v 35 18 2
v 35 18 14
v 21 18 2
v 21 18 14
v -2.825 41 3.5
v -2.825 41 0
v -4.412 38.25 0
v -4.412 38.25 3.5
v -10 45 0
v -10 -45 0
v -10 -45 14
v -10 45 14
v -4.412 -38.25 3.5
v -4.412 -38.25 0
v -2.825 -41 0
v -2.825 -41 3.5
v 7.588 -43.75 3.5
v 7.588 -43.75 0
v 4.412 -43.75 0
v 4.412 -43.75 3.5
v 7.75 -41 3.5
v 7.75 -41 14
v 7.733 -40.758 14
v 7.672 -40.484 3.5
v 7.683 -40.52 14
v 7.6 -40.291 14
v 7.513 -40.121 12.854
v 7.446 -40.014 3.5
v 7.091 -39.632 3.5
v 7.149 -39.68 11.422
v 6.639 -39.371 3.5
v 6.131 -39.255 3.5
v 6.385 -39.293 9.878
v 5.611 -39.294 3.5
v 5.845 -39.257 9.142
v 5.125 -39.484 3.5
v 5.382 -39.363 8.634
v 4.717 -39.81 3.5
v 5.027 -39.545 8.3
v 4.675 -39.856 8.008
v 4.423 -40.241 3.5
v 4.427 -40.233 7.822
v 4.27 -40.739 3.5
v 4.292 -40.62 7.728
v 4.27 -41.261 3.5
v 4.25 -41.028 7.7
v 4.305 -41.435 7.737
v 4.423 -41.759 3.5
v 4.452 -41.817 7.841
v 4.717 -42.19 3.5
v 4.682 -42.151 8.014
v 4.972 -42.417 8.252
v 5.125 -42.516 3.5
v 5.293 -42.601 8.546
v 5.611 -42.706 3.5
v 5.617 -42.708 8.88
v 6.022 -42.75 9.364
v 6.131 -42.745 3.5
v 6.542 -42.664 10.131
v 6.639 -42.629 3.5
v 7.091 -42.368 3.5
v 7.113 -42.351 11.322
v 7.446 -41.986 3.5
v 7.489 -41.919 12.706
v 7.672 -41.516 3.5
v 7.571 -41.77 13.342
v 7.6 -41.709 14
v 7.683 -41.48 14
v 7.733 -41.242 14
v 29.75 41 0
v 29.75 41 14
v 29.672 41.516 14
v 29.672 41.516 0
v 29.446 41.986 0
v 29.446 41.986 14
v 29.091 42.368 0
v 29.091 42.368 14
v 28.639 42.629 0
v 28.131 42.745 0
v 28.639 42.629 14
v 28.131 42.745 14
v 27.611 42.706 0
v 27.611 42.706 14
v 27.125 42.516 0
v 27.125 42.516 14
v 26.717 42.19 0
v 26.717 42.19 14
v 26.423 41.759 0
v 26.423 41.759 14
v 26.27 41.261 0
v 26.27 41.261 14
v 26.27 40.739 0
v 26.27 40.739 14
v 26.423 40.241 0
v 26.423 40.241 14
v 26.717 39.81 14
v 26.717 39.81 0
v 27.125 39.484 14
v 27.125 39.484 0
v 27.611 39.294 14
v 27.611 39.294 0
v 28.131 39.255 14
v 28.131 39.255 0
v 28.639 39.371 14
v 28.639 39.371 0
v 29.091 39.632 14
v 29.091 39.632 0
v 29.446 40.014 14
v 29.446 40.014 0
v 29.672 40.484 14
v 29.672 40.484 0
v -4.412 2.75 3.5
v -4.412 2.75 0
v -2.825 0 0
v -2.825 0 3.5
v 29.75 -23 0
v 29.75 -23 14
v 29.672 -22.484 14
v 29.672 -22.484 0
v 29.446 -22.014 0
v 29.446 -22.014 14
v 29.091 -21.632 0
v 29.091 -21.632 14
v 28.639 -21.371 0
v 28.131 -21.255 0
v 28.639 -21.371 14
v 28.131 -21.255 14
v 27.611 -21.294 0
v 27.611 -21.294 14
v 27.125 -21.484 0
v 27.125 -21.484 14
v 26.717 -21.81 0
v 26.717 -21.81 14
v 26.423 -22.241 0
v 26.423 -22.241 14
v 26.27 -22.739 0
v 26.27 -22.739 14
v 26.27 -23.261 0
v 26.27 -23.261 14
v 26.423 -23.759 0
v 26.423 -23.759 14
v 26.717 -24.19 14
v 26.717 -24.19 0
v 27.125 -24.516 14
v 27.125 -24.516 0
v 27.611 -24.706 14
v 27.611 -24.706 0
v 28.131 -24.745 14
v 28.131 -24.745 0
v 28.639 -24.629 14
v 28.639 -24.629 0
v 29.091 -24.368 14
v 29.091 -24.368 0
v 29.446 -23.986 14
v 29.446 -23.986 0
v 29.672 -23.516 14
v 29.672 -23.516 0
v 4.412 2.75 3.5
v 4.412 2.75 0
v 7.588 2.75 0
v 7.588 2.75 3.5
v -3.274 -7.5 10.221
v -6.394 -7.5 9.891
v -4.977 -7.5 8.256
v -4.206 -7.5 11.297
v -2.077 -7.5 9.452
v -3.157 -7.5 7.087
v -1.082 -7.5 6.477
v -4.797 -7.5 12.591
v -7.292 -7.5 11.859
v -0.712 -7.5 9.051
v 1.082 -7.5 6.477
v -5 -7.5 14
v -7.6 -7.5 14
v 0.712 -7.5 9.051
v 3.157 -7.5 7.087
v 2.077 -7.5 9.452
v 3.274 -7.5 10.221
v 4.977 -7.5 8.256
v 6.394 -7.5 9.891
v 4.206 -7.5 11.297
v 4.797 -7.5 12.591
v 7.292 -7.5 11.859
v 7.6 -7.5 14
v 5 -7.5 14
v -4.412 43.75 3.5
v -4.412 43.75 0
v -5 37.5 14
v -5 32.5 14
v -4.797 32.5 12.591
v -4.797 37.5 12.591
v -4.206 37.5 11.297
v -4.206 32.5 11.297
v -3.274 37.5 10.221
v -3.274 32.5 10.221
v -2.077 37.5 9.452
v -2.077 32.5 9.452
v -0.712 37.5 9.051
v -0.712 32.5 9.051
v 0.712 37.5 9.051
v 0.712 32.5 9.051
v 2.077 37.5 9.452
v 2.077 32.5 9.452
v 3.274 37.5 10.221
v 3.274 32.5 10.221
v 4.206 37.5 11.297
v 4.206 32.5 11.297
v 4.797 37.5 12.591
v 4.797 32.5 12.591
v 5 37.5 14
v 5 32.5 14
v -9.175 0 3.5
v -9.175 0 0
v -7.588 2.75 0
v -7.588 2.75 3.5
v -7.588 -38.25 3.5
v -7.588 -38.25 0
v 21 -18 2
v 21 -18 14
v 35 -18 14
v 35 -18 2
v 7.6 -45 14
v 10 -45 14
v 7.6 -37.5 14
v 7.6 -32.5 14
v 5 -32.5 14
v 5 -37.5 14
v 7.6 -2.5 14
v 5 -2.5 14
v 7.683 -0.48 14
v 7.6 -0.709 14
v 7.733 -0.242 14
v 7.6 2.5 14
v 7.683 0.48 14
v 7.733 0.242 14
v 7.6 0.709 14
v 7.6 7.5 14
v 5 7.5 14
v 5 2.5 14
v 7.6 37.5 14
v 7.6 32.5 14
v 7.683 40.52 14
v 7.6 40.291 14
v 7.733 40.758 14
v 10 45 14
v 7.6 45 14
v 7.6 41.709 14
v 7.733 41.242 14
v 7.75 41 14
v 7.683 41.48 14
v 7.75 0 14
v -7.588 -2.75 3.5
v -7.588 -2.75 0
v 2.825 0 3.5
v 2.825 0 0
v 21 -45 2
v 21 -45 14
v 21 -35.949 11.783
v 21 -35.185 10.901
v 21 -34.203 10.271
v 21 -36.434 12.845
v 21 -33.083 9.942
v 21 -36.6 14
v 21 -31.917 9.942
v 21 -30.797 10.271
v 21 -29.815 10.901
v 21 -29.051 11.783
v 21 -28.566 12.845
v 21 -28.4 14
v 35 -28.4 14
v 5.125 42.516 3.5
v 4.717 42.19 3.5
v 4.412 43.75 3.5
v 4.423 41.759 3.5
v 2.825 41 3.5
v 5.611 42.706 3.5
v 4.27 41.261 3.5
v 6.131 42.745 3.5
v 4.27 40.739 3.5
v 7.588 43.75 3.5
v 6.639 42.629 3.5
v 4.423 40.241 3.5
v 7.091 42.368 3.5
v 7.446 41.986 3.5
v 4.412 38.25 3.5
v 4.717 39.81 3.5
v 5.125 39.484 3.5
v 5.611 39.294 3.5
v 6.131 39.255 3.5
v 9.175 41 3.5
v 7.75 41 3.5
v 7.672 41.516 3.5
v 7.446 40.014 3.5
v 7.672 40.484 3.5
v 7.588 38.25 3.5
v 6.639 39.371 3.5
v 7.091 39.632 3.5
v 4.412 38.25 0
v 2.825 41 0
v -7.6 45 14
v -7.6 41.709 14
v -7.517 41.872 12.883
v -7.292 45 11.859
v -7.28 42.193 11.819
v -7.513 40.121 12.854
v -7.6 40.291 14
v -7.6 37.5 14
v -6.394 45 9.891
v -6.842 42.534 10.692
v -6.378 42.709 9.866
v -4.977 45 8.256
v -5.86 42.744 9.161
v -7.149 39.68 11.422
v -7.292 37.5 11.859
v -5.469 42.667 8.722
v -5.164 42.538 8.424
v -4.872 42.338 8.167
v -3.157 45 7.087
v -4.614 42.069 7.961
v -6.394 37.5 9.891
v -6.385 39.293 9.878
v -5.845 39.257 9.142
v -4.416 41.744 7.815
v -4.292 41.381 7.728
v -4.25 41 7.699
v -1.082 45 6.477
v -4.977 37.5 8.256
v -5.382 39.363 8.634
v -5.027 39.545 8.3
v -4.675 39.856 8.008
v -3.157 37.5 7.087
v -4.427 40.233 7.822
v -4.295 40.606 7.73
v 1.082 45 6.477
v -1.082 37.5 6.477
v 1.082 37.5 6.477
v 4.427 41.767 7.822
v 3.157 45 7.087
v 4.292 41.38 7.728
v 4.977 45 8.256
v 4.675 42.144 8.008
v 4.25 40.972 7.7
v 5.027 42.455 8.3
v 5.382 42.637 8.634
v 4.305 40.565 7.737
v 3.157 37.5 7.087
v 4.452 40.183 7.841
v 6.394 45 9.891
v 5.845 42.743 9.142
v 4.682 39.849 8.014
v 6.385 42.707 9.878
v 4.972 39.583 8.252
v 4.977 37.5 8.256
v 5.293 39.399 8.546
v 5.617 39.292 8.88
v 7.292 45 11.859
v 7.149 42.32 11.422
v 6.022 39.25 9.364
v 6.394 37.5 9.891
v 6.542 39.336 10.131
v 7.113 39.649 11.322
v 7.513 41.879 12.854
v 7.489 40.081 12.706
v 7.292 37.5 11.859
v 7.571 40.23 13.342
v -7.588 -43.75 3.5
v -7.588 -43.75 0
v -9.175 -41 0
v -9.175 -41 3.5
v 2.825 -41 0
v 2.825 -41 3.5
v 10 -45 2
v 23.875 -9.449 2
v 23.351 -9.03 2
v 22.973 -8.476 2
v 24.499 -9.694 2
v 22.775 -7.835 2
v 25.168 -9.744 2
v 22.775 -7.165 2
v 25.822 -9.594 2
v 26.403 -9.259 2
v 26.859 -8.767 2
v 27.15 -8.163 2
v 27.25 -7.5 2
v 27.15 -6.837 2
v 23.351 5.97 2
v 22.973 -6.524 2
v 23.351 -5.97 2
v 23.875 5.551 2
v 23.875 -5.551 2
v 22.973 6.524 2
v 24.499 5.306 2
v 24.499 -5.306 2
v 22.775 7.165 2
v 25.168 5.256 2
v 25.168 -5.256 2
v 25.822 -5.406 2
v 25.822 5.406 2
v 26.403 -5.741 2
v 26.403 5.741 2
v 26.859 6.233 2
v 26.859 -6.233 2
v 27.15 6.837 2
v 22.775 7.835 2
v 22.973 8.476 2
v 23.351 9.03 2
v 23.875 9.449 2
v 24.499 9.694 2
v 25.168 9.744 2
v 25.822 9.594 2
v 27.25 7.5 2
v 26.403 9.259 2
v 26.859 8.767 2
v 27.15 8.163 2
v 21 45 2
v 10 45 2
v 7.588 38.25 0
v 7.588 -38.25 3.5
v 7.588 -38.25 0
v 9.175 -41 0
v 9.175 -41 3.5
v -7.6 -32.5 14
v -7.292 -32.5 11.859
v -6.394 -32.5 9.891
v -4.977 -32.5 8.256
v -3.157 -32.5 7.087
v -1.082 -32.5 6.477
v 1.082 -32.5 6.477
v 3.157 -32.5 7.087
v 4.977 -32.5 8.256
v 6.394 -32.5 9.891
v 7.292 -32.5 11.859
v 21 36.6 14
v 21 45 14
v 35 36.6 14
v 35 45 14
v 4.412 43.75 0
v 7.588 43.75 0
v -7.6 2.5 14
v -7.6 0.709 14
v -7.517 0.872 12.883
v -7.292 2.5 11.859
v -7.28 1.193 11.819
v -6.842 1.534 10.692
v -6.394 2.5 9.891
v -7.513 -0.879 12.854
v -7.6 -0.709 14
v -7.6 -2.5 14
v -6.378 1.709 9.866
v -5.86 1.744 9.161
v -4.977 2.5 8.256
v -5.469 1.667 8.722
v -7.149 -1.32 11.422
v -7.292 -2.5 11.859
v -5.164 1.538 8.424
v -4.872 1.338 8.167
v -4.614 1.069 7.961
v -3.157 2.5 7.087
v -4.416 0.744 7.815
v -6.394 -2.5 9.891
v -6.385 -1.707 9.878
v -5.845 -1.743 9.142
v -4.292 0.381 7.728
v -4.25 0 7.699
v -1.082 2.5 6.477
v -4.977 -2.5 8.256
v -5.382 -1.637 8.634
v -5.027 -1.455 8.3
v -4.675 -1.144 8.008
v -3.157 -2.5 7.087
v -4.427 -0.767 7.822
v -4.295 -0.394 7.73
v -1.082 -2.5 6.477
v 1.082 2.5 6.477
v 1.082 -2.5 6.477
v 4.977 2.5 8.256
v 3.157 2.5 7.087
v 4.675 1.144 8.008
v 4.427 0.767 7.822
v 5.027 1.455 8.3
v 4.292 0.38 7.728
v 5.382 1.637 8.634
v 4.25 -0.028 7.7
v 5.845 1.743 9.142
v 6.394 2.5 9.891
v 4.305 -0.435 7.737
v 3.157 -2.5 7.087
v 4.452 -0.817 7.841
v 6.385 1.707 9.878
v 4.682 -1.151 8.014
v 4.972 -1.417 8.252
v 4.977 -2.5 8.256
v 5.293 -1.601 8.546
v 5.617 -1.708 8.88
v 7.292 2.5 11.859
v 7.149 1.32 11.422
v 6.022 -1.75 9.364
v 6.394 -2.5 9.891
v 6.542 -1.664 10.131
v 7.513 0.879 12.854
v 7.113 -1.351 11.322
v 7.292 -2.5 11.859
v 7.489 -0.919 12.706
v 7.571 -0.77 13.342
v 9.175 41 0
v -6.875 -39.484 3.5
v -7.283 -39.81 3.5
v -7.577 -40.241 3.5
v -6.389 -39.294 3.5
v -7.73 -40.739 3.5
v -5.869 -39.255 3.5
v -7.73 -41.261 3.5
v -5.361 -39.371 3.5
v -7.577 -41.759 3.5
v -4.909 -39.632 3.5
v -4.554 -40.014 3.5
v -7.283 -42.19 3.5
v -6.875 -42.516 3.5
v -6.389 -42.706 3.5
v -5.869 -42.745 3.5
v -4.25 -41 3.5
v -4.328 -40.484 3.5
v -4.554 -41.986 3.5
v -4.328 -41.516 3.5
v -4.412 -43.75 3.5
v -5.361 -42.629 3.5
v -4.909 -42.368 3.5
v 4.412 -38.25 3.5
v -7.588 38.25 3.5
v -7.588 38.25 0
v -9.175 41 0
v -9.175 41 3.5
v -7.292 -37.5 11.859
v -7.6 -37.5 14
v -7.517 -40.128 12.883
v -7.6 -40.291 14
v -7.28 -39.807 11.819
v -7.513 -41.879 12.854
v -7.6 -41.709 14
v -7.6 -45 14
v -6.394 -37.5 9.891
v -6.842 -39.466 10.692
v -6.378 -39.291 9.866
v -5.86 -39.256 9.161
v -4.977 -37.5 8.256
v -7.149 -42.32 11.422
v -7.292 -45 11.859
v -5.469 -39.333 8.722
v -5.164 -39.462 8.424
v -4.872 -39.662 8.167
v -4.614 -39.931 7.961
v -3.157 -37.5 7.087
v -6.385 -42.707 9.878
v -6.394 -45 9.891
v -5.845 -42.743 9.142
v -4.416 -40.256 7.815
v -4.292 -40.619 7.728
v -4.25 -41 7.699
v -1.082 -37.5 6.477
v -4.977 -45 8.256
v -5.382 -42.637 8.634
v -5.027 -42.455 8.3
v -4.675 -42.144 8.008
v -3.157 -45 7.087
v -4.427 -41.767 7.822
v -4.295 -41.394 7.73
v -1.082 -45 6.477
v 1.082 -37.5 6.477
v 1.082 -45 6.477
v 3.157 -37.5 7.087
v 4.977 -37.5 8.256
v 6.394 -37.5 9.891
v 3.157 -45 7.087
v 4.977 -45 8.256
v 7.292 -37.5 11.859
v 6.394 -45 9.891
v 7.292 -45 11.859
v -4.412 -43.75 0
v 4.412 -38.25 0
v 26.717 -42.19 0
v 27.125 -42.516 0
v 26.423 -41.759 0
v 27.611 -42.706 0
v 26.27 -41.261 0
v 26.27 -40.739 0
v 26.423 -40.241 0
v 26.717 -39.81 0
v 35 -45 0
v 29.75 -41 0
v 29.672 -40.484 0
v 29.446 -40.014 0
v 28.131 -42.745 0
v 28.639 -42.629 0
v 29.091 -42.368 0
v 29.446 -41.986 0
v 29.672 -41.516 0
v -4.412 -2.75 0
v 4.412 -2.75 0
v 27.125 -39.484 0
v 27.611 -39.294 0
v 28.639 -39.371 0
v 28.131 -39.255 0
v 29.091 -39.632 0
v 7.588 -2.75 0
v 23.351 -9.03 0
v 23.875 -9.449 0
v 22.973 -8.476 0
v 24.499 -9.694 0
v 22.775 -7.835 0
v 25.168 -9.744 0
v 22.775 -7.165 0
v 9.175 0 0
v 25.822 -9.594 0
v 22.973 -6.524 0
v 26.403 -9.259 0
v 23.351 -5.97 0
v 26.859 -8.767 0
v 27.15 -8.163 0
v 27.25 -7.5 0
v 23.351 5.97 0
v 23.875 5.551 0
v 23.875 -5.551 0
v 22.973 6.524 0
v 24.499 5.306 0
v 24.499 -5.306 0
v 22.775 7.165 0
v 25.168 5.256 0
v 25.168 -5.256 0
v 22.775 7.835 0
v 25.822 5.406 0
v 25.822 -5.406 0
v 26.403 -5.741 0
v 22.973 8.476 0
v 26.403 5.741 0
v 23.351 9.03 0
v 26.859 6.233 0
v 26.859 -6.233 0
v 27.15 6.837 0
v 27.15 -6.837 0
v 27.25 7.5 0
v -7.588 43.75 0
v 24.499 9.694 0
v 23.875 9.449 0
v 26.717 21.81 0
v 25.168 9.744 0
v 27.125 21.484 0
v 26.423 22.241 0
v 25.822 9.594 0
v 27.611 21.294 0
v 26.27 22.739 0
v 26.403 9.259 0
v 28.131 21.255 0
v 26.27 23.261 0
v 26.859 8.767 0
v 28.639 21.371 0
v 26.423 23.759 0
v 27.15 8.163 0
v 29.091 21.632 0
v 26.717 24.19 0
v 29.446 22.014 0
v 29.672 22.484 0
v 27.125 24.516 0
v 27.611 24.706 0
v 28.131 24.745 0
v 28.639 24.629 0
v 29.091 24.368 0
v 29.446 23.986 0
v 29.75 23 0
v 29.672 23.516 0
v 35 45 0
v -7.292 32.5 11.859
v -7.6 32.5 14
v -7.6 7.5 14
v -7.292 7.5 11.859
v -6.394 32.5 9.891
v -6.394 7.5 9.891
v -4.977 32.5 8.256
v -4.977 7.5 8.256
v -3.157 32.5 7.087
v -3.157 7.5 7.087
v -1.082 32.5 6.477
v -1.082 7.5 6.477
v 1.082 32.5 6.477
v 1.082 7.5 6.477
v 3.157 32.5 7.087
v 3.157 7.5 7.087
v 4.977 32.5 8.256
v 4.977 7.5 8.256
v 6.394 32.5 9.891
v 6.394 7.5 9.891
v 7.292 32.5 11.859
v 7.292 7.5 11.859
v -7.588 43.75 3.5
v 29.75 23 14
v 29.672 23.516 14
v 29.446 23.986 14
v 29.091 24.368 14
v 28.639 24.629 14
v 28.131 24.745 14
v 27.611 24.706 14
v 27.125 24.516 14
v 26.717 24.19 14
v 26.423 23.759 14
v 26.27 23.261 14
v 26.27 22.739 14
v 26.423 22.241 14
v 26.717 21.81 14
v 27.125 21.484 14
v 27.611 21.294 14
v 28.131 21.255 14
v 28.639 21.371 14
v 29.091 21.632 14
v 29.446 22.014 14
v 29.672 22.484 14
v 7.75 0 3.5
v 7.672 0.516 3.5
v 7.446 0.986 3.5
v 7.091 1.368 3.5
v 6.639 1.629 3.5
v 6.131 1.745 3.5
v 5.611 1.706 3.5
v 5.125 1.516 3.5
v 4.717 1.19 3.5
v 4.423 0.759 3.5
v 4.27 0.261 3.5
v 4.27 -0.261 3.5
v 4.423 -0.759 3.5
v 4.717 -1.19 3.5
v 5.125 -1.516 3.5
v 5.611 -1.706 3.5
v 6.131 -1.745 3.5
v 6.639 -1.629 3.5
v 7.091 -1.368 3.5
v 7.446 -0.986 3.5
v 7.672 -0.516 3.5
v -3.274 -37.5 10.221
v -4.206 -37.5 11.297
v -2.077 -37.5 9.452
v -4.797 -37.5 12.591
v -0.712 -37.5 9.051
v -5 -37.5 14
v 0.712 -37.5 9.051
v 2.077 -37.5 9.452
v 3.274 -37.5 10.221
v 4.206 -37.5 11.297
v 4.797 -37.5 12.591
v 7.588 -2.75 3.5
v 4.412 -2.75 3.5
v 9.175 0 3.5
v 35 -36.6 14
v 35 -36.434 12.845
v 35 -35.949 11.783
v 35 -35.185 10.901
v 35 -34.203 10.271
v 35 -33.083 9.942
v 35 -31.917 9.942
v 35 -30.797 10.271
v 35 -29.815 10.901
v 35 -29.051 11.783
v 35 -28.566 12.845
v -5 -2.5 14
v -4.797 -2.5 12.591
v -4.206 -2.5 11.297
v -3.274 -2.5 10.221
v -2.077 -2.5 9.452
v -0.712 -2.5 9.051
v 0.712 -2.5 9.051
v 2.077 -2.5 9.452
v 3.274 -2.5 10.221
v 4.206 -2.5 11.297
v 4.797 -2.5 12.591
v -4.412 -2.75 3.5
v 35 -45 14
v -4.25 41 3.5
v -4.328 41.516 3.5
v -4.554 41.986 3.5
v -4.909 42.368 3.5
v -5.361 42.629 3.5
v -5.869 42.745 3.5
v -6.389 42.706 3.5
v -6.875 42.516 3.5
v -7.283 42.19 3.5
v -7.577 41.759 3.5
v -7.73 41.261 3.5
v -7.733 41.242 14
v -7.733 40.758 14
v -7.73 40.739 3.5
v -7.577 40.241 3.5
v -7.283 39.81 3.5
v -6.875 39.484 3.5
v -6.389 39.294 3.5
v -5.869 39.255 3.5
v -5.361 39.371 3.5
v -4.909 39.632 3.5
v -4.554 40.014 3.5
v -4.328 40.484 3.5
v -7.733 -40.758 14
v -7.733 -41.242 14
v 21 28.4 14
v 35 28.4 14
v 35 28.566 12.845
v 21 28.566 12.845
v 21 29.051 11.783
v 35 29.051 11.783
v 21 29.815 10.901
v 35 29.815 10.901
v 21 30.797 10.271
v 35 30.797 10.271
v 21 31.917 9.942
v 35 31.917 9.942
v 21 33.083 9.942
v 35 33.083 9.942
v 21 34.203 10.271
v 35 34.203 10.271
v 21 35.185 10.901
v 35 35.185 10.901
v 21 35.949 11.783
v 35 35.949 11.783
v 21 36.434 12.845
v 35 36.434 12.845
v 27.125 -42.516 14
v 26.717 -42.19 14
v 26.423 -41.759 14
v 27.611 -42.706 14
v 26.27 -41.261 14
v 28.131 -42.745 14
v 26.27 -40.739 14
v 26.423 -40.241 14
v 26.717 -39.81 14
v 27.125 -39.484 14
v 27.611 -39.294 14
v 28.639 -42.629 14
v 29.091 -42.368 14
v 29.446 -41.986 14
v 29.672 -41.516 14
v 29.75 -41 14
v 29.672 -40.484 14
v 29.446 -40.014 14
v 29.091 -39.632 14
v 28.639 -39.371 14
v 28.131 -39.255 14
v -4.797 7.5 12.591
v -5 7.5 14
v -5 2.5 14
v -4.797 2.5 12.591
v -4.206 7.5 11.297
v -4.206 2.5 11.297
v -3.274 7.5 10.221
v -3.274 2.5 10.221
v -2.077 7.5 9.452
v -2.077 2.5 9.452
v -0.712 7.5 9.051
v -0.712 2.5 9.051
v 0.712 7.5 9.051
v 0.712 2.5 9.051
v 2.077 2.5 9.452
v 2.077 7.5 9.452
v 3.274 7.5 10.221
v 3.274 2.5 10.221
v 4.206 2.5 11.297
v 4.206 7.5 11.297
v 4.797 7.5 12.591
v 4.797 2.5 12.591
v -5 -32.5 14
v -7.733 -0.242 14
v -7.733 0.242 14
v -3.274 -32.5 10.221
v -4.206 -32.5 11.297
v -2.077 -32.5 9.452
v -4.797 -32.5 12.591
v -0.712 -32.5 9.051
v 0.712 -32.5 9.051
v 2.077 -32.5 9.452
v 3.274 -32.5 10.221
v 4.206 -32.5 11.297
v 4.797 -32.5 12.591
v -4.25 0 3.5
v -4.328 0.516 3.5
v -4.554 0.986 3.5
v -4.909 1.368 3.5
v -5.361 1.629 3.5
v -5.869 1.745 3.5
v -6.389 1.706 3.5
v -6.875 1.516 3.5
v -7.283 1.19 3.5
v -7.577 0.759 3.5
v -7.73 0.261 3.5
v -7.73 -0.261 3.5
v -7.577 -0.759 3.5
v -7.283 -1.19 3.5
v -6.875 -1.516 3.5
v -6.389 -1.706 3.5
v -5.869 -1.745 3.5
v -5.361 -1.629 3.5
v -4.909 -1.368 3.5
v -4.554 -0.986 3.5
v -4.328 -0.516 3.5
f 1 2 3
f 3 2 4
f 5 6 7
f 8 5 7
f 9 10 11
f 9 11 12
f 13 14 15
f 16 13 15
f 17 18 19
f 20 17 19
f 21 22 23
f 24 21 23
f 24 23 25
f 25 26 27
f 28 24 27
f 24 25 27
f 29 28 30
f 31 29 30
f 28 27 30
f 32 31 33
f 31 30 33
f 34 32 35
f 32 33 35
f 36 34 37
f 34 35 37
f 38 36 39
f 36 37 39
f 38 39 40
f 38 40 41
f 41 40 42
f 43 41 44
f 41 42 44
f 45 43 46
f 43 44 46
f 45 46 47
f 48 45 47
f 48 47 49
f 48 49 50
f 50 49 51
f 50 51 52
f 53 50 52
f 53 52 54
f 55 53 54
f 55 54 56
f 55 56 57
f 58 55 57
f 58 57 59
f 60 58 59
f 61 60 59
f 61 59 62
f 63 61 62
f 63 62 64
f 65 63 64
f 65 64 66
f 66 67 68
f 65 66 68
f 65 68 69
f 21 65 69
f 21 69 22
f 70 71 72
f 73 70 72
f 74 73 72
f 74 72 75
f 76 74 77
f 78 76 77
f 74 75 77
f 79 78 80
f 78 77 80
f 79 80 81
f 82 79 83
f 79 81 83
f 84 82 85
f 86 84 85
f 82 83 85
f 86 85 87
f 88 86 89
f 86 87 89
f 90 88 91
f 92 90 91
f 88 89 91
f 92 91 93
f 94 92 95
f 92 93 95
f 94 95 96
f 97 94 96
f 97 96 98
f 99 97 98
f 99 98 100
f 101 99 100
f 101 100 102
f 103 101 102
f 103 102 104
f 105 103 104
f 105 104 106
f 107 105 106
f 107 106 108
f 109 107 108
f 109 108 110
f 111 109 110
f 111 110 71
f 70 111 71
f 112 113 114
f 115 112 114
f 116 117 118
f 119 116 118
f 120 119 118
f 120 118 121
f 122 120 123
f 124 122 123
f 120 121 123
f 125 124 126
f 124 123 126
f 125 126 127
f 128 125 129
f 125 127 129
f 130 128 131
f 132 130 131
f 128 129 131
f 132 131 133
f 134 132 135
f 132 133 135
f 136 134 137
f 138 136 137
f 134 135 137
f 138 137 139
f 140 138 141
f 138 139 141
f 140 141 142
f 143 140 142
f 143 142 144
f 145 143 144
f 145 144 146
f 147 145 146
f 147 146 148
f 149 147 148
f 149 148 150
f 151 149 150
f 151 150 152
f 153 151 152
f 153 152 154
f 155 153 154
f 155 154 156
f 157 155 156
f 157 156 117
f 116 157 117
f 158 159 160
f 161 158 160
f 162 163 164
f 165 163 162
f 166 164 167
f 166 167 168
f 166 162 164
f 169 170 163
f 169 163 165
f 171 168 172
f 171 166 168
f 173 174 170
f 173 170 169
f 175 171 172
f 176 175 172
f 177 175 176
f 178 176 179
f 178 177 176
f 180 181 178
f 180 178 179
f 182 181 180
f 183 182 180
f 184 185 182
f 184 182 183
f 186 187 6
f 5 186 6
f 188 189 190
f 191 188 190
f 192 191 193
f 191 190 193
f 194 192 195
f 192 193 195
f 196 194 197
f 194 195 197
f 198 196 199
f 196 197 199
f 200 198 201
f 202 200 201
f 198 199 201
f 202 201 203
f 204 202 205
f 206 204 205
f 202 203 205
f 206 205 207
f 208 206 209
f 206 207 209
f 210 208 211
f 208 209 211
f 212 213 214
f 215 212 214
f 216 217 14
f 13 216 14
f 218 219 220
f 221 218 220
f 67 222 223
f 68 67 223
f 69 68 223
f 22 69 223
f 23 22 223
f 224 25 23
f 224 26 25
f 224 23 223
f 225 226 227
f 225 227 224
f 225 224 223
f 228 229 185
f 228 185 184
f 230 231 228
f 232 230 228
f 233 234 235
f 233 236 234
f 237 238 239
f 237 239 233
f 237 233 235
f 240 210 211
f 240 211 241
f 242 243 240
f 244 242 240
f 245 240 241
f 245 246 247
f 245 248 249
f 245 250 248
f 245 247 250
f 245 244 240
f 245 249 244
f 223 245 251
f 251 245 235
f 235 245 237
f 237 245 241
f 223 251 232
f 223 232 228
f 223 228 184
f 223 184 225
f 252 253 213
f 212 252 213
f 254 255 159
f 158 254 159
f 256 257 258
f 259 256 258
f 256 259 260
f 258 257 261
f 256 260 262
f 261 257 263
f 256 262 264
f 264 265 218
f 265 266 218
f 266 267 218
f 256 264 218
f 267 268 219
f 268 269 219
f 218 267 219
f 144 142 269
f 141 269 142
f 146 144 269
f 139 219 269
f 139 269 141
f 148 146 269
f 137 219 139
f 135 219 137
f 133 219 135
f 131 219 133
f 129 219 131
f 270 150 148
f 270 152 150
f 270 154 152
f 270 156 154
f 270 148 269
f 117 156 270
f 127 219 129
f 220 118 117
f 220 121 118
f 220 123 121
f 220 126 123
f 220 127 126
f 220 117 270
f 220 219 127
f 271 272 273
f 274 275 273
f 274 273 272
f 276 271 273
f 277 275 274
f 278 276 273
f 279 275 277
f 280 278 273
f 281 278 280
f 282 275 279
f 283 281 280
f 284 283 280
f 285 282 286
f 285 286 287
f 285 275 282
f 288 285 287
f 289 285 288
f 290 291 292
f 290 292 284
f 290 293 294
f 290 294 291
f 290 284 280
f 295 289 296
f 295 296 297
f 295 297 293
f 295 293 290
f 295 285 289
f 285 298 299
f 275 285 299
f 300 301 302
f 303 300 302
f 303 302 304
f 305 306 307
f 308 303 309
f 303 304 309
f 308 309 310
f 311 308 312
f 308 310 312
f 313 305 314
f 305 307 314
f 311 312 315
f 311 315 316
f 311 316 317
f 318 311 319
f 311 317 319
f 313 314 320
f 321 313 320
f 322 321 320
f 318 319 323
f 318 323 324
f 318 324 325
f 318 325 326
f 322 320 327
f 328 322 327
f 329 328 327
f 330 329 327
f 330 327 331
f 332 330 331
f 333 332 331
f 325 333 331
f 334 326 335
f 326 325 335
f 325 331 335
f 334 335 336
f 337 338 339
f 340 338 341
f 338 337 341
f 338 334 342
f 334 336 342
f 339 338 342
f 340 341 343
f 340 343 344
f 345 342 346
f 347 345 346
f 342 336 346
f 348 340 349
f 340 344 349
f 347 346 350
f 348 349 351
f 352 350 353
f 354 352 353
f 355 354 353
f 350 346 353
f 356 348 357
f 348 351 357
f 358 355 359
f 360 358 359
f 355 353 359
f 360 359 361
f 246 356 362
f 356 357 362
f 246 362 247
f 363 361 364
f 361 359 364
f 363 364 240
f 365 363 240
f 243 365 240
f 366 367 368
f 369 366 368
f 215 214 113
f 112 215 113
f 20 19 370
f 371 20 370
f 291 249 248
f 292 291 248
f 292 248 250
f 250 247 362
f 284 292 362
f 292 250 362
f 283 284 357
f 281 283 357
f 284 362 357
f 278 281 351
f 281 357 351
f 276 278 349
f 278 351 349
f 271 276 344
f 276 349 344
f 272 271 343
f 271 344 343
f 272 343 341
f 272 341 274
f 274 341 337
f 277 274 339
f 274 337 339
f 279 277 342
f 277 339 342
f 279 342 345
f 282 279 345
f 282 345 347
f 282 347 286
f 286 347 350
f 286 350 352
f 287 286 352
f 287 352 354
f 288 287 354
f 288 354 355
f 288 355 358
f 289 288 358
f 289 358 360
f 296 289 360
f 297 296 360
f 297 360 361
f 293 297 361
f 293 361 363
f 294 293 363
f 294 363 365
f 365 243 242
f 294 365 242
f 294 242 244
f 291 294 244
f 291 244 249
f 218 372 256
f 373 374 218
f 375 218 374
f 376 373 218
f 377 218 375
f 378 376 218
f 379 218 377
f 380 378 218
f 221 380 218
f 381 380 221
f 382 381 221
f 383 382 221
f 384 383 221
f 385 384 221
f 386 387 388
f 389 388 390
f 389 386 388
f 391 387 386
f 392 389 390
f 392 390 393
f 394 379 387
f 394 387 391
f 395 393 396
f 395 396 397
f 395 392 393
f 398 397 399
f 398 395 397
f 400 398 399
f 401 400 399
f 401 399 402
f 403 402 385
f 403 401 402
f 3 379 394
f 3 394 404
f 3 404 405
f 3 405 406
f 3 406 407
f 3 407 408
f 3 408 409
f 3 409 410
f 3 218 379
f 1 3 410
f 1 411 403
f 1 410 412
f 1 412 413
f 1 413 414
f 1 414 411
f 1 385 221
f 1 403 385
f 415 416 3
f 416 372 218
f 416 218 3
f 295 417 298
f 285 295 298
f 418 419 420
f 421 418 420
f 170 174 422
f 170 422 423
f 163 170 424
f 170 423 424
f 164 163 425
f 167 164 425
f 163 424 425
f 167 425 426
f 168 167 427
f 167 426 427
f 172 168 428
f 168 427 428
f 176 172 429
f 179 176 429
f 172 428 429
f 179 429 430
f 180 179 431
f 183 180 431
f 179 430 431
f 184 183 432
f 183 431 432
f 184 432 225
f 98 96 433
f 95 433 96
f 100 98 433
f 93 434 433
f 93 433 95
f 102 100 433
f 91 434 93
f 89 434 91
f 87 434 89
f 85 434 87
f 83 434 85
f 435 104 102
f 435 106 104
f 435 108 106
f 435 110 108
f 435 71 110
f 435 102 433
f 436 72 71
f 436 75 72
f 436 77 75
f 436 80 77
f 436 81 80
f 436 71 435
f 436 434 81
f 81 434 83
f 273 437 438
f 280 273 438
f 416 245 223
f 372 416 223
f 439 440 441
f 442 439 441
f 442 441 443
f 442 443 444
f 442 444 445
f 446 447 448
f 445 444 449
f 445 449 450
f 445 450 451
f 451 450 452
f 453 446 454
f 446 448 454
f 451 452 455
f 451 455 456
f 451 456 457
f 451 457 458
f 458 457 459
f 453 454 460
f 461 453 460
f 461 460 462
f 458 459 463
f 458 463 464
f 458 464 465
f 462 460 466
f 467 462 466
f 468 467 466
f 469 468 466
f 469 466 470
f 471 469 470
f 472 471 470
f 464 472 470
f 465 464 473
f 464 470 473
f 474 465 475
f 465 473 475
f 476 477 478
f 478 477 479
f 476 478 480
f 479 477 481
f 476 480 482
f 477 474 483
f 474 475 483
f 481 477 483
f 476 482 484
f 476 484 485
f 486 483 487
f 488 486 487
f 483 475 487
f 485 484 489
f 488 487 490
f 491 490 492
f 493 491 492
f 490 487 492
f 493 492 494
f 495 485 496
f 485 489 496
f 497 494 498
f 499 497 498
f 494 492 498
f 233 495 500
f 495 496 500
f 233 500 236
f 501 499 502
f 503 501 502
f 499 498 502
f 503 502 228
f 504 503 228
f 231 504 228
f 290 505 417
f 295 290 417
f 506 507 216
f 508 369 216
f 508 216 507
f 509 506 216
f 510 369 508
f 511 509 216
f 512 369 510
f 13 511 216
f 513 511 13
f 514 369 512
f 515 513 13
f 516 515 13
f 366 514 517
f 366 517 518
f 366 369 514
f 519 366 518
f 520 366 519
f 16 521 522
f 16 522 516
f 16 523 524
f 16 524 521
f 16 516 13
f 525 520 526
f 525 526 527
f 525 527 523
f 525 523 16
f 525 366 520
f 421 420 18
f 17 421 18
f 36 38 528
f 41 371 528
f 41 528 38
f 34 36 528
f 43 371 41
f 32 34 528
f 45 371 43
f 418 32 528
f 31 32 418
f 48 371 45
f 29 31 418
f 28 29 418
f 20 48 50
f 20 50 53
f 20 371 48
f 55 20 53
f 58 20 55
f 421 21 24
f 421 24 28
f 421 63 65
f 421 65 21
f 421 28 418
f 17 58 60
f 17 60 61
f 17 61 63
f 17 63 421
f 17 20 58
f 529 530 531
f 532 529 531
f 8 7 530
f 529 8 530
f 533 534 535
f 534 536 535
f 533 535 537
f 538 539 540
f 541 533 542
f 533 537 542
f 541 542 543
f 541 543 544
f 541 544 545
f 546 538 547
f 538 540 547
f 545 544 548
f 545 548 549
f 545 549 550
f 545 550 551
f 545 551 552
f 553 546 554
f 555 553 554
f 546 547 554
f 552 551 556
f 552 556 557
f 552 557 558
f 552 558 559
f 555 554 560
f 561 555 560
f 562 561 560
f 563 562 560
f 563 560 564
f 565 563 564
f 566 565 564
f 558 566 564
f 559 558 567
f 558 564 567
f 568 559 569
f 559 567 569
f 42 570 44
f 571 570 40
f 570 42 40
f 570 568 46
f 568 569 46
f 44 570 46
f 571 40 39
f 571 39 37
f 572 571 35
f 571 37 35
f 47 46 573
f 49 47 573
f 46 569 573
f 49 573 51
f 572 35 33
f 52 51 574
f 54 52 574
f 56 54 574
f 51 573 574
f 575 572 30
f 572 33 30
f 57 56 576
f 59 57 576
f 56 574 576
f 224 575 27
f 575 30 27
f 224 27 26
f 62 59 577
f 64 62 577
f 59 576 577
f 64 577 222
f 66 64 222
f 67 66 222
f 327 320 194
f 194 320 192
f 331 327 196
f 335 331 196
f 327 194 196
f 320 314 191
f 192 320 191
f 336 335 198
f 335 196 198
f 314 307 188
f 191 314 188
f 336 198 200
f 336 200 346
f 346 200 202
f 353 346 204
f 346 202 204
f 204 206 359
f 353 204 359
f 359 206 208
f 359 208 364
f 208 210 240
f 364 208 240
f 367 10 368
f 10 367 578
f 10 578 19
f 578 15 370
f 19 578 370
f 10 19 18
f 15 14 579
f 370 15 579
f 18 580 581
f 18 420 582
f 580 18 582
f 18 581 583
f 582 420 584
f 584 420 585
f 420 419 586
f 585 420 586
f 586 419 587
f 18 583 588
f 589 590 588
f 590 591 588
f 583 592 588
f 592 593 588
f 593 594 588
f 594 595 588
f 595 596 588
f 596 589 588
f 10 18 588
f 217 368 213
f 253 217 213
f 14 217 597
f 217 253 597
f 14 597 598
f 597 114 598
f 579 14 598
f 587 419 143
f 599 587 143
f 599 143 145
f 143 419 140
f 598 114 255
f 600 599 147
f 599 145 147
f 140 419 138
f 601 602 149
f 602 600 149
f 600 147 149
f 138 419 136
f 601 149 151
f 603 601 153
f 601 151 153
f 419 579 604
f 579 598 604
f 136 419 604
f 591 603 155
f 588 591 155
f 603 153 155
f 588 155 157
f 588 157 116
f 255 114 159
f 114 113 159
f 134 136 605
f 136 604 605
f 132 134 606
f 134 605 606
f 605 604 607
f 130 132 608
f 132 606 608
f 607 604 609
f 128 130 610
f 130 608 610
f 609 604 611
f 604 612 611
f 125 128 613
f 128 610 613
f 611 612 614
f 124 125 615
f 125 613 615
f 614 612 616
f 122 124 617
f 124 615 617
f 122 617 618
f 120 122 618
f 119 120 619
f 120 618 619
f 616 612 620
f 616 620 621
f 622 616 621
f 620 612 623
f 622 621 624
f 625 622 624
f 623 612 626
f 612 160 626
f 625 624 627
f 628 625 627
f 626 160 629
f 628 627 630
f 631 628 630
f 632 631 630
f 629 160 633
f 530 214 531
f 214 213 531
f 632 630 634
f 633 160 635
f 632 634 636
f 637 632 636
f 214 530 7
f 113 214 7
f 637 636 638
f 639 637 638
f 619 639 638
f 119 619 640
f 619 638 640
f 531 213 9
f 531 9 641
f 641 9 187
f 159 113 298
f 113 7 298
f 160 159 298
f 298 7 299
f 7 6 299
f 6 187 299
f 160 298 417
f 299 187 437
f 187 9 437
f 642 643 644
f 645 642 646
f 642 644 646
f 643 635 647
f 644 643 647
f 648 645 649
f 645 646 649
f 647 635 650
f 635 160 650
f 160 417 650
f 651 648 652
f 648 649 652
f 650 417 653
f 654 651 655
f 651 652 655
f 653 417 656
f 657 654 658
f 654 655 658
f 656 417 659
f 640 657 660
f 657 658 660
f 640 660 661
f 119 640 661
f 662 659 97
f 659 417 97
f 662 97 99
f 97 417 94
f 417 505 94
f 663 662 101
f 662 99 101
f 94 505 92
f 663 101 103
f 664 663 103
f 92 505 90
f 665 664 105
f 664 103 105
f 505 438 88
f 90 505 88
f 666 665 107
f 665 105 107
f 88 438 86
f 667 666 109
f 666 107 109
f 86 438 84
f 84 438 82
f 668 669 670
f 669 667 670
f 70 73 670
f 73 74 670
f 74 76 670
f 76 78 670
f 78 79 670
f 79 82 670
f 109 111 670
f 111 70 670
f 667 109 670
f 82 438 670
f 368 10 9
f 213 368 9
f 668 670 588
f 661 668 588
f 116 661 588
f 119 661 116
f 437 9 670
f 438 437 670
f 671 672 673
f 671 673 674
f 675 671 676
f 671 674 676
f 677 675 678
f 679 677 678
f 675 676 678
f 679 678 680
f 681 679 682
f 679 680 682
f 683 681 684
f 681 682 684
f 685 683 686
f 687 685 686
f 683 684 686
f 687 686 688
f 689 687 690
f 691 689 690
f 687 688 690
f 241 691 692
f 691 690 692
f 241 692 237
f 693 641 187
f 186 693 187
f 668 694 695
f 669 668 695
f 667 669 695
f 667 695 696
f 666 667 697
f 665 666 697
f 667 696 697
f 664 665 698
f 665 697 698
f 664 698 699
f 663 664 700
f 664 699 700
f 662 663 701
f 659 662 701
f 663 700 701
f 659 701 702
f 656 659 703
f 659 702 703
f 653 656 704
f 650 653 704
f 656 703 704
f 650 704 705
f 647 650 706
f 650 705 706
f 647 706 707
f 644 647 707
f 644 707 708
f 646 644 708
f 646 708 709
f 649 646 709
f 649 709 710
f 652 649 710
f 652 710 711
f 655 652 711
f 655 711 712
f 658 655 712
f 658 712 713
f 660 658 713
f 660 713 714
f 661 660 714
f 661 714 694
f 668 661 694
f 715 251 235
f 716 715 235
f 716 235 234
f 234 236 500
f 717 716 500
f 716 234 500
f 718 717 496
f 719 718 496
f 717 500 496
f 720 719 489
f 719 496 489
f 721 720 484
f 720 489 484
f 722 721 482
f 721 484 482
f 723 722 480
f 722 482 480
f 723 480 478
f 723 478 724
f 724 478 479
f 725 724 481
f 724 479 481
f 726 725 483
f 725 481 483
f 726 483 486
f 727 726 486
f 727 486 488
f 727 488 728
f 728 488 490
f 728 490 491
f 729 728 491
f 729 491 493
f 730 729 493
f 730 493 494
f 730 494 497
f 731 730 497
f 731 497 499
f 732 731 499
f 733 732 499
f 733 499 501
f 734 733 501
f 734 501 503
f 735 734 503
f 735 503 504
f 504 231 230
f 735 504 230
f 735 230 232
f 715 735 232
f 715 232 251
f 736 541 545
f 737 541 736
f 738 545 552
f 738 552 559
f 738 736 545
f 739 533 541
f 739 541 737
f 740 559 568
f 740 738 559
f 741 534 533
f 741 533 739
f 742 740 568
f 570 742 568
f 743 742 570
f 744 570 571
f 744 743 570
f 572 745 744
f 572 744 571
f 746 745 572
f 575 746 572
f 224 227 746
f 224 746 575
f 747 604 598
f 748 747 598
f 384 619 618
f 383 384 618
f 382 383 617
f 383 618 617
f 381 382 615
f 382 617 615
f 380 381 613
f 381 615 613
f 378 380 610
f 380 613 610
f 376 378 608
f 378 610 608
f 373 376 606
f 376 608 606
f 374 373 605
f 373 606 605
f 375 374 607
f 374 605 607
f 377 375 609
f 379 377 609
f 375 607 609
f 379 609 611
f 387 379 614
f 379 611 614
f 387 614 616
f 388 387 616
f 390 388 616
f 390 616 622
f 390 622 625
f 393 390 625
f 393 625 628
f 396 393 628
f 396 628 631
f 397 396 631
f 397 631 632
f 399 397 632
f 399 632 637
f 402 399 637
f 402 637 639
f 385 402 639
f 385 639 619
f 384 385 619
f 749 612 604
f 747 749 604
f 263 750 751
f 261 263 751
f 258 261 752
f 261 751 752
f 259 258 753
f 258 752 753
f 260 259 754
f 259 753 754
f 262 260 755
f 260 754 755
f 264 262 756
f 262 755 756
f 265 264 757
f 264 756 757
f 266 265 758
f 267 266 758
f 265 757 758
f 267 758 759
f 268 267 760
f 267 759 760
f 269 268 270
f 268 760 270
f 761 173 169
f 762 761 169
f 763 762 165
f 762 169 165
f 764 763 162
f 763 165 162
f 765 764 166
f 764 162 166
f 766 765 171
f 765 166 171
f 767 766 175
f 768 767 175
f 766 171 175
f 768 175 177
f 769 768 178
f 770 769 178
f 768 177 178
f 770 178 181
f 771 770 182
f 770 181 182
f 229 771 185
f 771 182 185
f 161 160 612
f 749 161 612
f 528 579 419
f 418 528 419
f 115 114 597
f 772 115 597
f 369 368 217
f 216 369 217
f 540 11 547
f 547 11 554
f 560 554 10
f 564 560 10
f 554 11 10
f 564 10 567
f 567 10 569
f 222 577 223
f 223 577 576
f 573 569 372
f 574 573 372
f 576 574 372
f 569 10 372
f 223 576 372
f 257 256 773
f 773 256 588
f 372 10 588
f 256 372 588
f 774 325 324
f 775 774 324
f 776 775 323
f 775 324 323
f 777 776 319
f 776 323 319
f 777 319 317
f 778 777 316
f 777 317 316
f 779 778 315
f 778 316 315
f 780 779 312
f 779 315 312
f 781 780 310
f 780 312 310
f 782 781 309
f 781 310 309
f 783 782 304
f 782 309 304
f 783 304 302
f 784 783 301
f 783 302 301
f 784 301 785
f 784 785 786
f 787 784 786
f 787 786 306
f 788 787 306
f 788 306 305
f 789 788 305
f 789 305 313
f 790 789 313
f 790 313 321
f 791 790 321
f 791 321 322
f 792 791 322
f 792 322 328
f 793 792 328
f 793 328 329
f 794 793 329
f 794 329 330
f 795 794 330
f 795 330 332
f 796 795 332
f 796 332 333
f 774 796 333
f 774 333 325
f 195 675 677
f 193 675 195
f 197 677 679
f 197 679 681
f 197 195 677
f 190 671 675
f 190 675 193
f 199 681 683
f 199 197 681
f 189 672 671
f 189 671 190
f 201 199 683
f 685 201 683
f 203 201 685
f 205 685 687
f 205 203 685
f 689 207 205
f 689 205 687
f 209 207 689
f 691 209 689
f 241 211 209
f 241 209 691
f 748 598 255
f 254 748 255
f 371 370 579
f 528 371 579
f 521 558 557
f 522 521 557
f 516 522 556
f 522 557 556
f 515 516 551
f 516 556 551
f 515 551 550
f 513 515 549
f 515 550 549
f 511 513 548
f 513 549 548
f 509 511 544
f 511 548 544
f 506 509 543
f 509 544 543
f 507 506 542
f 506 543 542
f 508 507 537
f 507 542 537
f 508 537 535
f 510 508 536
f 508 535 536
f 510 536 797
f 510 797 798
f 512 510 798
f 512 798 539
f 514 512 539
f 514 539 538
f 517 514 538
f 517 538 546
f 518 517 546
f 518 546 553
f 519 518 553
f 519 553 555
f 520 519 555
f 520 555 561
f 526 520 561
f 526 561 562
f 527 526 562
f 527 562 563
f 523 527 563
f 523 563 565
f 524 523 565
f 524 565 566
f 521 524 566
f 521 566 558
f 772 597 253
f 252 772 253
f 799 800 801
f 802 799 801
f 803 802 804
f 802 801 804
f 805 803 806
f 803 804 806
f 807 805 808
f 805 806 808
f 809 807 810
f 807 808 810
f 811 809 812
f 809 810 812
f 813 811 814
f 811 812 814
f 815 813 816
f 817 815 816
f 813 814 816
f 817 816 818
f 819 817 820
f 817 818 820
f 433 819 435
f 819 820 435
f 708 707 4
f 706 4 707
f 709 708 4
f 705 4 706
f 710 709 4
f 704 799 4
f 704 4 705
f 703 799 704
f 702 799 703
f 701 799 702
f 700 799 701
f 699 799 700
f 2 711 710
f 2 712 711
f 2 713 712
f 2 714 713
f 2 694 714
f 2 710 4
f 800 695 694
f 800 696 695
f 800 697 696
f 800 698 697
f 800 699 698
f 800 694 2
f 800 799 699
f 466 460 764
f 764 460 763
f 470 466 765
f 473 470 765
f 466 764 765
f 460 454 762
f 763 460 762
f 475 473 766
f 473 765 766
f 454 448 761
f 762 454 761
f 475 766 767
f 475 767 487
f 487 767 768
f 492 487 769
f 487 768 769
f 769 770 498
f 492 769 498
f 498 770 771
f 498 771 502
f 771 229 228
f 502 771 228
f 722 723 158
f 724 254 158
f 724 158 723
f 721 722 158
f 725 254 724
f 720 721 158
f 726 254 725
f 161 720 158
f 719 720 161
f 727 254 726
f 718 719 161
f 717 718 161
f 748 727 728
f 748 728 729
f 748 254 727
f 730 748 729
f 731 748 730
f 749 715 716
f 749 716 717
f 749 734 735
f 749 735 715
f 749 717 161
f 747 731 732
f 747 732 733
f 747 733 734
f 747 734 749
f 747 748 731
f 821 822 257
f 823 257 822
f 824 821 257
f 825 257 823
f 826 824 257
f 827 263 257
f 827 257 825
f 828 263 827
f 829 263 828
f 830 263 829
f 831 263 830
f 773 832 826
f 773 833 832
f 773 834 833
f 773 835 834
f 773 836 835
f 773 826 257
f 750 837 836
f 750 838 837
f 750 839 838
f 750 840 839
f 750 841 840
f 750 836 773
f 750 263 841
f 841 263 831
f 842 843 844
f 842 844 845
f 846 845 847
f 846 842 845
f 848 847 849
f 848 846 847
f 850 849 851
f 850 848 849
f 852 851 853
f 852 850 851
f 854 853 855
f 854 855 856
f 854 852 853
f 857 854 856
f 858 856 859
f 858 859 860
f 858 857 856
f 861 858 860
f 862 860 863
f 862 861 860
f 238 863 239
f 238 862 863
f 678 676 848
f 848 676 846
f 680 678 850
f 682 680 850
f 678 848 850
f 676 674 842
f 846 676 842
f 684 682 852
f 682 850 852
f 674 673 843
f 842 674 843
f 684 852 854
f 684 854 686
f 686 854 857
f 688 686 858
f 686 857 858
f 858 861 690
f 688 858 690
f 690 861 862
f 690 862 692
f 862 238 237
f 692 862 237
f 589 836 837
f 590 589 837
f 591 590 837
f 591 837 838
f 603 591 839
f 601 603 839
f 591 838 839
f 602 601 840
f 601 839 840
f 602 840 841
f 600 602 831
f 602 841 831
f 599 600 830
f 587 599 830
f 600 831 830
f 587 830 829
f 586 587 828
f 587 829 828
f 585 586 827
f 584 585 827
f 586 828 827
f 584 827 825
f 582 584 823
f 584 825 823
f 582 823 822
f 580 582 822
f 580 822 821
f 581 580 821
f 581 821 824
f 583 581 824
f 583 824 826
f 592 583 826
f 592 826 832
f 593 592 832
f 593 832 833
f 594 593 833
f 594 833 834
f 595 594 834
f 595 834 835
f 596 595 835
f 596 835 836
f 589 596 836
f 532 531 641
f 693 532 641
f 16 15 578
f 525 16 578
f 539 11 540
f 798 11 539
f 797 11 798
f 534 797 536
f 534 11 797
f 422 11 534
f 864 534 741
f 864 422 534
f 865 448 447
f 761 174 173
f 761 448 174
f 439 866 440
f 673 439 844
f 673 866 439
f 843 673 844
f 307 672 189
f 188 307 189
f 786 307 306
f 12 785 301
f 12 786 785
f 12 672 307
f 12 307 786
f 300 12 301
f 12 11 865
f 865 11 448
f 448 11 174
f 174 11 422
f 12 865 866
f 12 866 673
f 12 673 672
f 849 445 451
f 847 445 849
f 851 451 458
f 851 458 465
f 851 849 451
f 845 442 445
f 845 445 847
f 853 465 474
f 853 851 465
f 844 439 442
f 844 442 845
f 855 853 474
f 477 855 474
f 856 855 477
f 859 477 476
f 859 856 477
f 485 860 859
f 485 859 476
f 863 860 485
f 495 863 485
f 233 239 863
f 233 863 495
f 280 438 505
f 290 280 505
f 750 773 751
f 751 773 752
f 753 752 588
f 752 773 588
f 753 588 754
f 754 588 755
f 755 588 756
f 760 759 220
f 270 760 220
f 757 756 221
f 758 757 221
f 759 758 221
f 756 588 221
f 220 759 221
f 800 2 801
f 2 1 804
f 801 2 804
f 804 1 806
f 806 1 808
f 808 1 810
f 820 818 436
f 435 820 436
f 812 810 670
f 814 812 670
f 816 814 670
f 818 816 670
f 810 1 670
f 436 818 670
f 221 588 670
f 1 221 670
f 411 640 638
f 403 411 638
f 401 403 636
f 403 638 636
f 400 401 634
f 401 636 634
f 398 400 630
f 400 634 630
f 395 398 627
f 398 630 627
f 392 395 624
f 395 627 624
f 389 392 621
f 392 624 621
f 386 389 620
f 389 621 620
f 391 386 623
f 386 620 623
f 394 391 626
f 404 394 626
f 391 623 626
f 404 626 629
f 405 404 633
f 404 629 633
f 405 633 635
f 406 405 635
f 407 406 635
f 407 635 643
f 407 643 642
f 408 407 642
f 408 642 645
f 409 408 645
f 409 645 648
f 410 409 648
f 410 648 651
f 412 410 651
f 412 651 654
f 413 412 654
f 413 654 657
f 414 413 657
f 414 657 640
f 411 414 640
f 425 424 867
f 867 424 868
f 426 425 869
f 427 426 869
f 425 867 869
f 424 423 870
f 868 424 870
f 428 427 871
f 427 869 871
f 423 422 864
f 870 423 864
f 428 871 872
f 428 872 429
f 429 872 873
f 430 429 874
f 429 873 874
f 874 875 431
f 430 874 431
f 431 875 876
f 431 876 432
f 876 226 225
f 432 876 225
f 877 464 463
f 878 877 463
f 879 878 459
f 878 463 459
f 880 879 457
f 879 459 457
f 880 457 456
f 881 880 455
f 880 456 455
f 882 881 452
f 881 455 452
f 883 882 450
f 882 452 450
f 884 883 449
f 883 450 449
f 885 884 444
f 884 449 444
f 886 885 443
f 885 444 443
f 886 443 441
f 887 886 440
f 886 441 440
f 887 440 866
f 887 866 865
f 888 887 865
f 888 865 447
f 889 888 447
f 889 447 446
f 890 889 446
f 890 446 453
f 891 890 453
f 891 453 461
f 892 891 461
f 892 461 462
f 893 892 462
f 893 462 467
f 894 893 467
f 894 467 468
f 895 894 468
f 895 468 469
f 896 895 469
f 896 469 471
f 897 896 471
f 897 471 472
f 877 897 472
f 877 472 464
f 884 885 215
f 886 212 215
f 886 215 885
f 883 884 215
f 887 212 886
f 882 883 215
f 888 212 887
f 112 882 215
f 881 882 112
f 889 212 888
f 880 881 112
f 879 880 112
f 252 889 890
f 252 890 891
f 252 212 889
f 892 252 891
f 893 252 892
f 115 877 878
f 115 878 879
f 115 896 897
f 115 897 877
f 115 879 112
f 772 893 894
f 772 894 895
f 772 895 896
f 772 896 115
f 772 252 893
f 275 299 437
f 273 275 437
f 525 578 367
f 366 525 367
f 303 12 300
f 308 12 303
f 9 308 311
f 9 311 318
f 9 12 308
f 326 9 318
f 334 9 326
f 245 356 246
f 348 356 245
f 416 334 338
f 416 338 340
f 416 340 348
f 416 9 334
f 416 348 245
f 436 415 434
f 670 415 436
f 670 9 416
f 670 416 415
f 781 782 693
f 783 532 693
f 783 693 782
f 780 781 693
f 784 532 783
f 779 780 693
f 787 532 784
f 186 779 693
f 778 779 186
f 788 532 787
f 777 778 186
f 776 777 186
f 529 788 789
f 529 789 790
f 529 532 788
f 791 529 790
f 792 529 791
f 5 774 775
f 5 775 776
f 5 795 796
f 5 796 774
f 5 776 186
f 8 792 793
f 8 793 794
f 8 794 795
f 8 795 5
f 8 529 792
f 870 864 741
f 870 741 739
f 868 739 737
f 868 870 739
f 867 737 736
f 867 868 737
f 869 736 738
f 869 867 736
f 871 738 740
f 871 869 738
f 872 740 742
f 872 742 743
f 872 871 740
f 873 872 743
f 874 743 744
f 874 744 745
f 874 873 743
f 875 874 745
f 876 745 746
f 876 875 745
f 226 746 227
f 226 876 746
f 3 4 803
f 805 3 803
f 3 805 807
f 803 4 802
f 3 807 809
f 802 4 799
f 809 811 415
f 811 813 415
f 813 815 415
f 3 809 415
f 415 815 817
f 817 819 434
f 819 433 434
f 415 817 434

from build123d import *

# Parameters (mm, degrees)
PAD004_DEPTH    = 5
PAD003_DEPTH    = 5
PAD002_DEPTH    = 5
PAD001_DEPTH    = 5
SKETCH_W        = 45
SKETCH_H        = 90
PAD_DEPTH       = 14
SKETCH001_R     = 7.6
POCKET_DEPTH    = 90.001
SKETCH002_R     = 1.75
POCKET001_DEPTH = 14.001
POCKET002_DEPTH = 12
SKETCH004_R     = 2.25
POCKET003_DEPTH = 14.001
SKETCH008_R     = 4.1
POCKET005_DEPTH = 20
POCKET006_DEPTH = 3.5
POCKET007_DEPTH = 5


with BuildPart() as pad004:
    # Sketch021 → Pad004 (new body)
    with BuildSketch(Plane.XZ.offset(32.5)):
        with BuildLine():
            ThreePointArc((-7.6, 14), (0, 6.4), (7.6, 14))
            Line((7.6, 14), (5, 14))
            ThreePointArc((-5, 14), (0, 9), (5, 14))
            Line((-7.6, 14), (-5, 14))
        make_face()
    extrude(amount=PAD004_DEPTH)


with BuildPart() as pad003:
    # Sketch020 → Pad003 (new body)
    with BuildSketch(Plane.XZ.offset(-32.5)):
        with BuildLine():
            ThreePointArc((-7.6, 14), (0, 6.4), (7.6, 14))
            Line((7.6, 14), (5, 14))
            ThreePointArc((-5, 14), (0, 9), (5, 14))
            Line((-7.6, 14), (-5, 14))
        make_face()
    extrude(amount=-PAD003_DEPTH)


with BuildPart() as pad002:
    # Sketch019 → Pad002 (new body)
    with BuildSketch(Plane.XZ.offset(7.5)):
        with BuildLine():
            ThreePointArc((-7.6, 14), (0, 6.4), (7.6, 14))
            Line((7.6, 14), (5, 14))
            ThreePointArc((-5, 14), (0, 9), (5, 14))
            Line((-7.6, 14), (-5, 14))
        make_face()
    extrude(amount=-PAD002_DEPTH)


with BuildPart() as pad001:
    # Sketch018 → Pad001 (new body)
    with BuildSketch(Plane.XZ.offset(-7.5)):
        with BuildLine():
            ThreePointArc((-7.6, 14), (0, 6.4), (7.6, 14))
            Line((7.6, 14), (5, 14))
            ThreePointArc((-5, 14), (0, 9), (5, 14))
            Line((-7.6, 14), (-5, 14))
        make_face()
    extrude(amount=PAD001_DEPTH)


with BuildPart() as fusion:
    # Sketch → Pad (new body)
    with BuildSketch(Plane.XY):
        with Locations((12.5, 0)):
            Rectangle(SKETCH_W, SKETCH_H)
    extrude(amount=PAD_DEPTH)

    # Sketch001 → Pocket (cut, through all)
    with BuildSketch(Plane.XZ.offset(45)):
        with Locations((0, 14)):
            Circle(SKETCH001_R)
    extrude(amount=-POCKET_DEPTH, mode=Mode.SUBTRACT)

    # Sketch002 → Pocket001 (cut, through all)
    with BuildSketch(Plane.XY.offset(14)):
        with Locations((-6, 41)):
            Circle(SKETCH002_R)
        with Locations((-6, -41)):
            Circle(SKETCH002_R)
        with Locations((6, 41)):
            Circle(SKETCH002_R)
        with Locations((6, -41)):
            Circle(SKETCH002_R)
        with Locations((6, 0)):
            Circle(SKETCH002_R)
        with Locations((-6, 0)):
            Circle(SKETCH002_R)
        with Locations((28, 41)):
            Circle(SKETCH002_R)
        with Locations((28, 23)):
            Circle(SKETCH002_R)
        with Locations((28, -23)):
            Circle(SKETCH002_R)
        with Locations((28, -41)):
            Circle(SKETCH002_R)
    extrude(amount=-POCKET001_DEPTH, mode=Mode.SUBTRACT)

    # Sketch003 → Pocket002 (cut)
    with BuildSketch(Plane.XY.offset(14)):
        Polygon((10, 50), (10, -50), (21, -50), (21, -18), (41, -18), (41, 18), (21, 18), (21, 50), align=None)
    extrude(amount=-POCKET002_DEPTH, mode=Mode.SUBTRACT)

    # Sketch004 → Pocket003 (cut, through all)
    with BuildSketch(Plane(origin=(0, 0, 0), x_dir=(1, 0, 0), z_dir=(0, 0, -1))):
        with Locations((25, 7.5)):
            Circle(SKETCH004_R)
        with Locations((25, -7.5)):
            Circle(SKETCH004_R)
    extrude(amount=-POCKET003_DEPTH, mode=Mode.SUBTRACT)

    # Sketch008 → Pocket005 (cut)
    with BuildSketch(Plane.YZ.offset(35)):
        with Locations((-32.5, 14)):
            Circle(SKETCH008_R)
        with Locations((32.5, 14)):
            Circle(SKETCH008_R)
    extrude(amount=-POCKET005_DEPTH, mode=Mode.SUBTRACT)

    # Sketch012 → Pocket006 (cut)
    with BuildSketch(Plane(origin=(0, 0, 0), x_dir=(1, 0, 0), z_dir=(0, 0, -1))):
        Polygon((-4.412285, 2.750003), (-7.587715, 2.750003), (-9.17543, 0), (-7.587715, -2.750003), (-4.412285, -2.750003), (-2.82457, 0), align=None)
        Polygon((7.587715, 2.750003), (4.412285, 2.750003), (2.82457, 0), (4.412285, -2.750003), (7.587715, -2.750003), (9.17543, 0), align=None)
        Polygon((-4.412285, 43.750003), (-7.587715, 43.750003), (-9.17543, 41), (-7.587715, 38.249997), (-4.412285, 38.249997), (-2.82457, 41), align=None)
        Polygon((7.587715, -38.249997), (4.412285, -38.249997), (2.82457, -41), (4.412285, -43.750003), (7.587715, -43.750003), (9.17543, -41), align=None)
        Polygon((7.587715, 43.750003), (4.412285, 43.750003), (2.82457, 41), (4.412285, 38.249997), (7.587715, 38.249997), (9.17543, 41), align=None)
        Polygon((-4.412285, -38.249997), (-7.587715, -38.249997), (-9.17543, -41), (-7.587715, -43.750003), (-4.412285, -43.750003), (-2.82457, -41), align=None)
    extrude(amount=-POCKET006_DEPTH, mode=Mode.SUBTRACT)

    # Sketch022 → Pocket007 (cut)
    with BuildSketch(Plane.XY.offset(2)):
        Polygon((44.573685, 18), (36, 3.425), (36, -3.425), (44.573685, -18), (55.573685, -18), (55.573685, 18), align=None)
    extrude(amount=-POCKET007_DEPTH, mode=Mode.SUBTRACT)

    # Fusion: union Pad004, Pad003, Pad002, Pad001
    add(pad004.part)
    add(pad003.part)
    add(pad002.part)
    add(pad001.part)


solid = fusion.part
